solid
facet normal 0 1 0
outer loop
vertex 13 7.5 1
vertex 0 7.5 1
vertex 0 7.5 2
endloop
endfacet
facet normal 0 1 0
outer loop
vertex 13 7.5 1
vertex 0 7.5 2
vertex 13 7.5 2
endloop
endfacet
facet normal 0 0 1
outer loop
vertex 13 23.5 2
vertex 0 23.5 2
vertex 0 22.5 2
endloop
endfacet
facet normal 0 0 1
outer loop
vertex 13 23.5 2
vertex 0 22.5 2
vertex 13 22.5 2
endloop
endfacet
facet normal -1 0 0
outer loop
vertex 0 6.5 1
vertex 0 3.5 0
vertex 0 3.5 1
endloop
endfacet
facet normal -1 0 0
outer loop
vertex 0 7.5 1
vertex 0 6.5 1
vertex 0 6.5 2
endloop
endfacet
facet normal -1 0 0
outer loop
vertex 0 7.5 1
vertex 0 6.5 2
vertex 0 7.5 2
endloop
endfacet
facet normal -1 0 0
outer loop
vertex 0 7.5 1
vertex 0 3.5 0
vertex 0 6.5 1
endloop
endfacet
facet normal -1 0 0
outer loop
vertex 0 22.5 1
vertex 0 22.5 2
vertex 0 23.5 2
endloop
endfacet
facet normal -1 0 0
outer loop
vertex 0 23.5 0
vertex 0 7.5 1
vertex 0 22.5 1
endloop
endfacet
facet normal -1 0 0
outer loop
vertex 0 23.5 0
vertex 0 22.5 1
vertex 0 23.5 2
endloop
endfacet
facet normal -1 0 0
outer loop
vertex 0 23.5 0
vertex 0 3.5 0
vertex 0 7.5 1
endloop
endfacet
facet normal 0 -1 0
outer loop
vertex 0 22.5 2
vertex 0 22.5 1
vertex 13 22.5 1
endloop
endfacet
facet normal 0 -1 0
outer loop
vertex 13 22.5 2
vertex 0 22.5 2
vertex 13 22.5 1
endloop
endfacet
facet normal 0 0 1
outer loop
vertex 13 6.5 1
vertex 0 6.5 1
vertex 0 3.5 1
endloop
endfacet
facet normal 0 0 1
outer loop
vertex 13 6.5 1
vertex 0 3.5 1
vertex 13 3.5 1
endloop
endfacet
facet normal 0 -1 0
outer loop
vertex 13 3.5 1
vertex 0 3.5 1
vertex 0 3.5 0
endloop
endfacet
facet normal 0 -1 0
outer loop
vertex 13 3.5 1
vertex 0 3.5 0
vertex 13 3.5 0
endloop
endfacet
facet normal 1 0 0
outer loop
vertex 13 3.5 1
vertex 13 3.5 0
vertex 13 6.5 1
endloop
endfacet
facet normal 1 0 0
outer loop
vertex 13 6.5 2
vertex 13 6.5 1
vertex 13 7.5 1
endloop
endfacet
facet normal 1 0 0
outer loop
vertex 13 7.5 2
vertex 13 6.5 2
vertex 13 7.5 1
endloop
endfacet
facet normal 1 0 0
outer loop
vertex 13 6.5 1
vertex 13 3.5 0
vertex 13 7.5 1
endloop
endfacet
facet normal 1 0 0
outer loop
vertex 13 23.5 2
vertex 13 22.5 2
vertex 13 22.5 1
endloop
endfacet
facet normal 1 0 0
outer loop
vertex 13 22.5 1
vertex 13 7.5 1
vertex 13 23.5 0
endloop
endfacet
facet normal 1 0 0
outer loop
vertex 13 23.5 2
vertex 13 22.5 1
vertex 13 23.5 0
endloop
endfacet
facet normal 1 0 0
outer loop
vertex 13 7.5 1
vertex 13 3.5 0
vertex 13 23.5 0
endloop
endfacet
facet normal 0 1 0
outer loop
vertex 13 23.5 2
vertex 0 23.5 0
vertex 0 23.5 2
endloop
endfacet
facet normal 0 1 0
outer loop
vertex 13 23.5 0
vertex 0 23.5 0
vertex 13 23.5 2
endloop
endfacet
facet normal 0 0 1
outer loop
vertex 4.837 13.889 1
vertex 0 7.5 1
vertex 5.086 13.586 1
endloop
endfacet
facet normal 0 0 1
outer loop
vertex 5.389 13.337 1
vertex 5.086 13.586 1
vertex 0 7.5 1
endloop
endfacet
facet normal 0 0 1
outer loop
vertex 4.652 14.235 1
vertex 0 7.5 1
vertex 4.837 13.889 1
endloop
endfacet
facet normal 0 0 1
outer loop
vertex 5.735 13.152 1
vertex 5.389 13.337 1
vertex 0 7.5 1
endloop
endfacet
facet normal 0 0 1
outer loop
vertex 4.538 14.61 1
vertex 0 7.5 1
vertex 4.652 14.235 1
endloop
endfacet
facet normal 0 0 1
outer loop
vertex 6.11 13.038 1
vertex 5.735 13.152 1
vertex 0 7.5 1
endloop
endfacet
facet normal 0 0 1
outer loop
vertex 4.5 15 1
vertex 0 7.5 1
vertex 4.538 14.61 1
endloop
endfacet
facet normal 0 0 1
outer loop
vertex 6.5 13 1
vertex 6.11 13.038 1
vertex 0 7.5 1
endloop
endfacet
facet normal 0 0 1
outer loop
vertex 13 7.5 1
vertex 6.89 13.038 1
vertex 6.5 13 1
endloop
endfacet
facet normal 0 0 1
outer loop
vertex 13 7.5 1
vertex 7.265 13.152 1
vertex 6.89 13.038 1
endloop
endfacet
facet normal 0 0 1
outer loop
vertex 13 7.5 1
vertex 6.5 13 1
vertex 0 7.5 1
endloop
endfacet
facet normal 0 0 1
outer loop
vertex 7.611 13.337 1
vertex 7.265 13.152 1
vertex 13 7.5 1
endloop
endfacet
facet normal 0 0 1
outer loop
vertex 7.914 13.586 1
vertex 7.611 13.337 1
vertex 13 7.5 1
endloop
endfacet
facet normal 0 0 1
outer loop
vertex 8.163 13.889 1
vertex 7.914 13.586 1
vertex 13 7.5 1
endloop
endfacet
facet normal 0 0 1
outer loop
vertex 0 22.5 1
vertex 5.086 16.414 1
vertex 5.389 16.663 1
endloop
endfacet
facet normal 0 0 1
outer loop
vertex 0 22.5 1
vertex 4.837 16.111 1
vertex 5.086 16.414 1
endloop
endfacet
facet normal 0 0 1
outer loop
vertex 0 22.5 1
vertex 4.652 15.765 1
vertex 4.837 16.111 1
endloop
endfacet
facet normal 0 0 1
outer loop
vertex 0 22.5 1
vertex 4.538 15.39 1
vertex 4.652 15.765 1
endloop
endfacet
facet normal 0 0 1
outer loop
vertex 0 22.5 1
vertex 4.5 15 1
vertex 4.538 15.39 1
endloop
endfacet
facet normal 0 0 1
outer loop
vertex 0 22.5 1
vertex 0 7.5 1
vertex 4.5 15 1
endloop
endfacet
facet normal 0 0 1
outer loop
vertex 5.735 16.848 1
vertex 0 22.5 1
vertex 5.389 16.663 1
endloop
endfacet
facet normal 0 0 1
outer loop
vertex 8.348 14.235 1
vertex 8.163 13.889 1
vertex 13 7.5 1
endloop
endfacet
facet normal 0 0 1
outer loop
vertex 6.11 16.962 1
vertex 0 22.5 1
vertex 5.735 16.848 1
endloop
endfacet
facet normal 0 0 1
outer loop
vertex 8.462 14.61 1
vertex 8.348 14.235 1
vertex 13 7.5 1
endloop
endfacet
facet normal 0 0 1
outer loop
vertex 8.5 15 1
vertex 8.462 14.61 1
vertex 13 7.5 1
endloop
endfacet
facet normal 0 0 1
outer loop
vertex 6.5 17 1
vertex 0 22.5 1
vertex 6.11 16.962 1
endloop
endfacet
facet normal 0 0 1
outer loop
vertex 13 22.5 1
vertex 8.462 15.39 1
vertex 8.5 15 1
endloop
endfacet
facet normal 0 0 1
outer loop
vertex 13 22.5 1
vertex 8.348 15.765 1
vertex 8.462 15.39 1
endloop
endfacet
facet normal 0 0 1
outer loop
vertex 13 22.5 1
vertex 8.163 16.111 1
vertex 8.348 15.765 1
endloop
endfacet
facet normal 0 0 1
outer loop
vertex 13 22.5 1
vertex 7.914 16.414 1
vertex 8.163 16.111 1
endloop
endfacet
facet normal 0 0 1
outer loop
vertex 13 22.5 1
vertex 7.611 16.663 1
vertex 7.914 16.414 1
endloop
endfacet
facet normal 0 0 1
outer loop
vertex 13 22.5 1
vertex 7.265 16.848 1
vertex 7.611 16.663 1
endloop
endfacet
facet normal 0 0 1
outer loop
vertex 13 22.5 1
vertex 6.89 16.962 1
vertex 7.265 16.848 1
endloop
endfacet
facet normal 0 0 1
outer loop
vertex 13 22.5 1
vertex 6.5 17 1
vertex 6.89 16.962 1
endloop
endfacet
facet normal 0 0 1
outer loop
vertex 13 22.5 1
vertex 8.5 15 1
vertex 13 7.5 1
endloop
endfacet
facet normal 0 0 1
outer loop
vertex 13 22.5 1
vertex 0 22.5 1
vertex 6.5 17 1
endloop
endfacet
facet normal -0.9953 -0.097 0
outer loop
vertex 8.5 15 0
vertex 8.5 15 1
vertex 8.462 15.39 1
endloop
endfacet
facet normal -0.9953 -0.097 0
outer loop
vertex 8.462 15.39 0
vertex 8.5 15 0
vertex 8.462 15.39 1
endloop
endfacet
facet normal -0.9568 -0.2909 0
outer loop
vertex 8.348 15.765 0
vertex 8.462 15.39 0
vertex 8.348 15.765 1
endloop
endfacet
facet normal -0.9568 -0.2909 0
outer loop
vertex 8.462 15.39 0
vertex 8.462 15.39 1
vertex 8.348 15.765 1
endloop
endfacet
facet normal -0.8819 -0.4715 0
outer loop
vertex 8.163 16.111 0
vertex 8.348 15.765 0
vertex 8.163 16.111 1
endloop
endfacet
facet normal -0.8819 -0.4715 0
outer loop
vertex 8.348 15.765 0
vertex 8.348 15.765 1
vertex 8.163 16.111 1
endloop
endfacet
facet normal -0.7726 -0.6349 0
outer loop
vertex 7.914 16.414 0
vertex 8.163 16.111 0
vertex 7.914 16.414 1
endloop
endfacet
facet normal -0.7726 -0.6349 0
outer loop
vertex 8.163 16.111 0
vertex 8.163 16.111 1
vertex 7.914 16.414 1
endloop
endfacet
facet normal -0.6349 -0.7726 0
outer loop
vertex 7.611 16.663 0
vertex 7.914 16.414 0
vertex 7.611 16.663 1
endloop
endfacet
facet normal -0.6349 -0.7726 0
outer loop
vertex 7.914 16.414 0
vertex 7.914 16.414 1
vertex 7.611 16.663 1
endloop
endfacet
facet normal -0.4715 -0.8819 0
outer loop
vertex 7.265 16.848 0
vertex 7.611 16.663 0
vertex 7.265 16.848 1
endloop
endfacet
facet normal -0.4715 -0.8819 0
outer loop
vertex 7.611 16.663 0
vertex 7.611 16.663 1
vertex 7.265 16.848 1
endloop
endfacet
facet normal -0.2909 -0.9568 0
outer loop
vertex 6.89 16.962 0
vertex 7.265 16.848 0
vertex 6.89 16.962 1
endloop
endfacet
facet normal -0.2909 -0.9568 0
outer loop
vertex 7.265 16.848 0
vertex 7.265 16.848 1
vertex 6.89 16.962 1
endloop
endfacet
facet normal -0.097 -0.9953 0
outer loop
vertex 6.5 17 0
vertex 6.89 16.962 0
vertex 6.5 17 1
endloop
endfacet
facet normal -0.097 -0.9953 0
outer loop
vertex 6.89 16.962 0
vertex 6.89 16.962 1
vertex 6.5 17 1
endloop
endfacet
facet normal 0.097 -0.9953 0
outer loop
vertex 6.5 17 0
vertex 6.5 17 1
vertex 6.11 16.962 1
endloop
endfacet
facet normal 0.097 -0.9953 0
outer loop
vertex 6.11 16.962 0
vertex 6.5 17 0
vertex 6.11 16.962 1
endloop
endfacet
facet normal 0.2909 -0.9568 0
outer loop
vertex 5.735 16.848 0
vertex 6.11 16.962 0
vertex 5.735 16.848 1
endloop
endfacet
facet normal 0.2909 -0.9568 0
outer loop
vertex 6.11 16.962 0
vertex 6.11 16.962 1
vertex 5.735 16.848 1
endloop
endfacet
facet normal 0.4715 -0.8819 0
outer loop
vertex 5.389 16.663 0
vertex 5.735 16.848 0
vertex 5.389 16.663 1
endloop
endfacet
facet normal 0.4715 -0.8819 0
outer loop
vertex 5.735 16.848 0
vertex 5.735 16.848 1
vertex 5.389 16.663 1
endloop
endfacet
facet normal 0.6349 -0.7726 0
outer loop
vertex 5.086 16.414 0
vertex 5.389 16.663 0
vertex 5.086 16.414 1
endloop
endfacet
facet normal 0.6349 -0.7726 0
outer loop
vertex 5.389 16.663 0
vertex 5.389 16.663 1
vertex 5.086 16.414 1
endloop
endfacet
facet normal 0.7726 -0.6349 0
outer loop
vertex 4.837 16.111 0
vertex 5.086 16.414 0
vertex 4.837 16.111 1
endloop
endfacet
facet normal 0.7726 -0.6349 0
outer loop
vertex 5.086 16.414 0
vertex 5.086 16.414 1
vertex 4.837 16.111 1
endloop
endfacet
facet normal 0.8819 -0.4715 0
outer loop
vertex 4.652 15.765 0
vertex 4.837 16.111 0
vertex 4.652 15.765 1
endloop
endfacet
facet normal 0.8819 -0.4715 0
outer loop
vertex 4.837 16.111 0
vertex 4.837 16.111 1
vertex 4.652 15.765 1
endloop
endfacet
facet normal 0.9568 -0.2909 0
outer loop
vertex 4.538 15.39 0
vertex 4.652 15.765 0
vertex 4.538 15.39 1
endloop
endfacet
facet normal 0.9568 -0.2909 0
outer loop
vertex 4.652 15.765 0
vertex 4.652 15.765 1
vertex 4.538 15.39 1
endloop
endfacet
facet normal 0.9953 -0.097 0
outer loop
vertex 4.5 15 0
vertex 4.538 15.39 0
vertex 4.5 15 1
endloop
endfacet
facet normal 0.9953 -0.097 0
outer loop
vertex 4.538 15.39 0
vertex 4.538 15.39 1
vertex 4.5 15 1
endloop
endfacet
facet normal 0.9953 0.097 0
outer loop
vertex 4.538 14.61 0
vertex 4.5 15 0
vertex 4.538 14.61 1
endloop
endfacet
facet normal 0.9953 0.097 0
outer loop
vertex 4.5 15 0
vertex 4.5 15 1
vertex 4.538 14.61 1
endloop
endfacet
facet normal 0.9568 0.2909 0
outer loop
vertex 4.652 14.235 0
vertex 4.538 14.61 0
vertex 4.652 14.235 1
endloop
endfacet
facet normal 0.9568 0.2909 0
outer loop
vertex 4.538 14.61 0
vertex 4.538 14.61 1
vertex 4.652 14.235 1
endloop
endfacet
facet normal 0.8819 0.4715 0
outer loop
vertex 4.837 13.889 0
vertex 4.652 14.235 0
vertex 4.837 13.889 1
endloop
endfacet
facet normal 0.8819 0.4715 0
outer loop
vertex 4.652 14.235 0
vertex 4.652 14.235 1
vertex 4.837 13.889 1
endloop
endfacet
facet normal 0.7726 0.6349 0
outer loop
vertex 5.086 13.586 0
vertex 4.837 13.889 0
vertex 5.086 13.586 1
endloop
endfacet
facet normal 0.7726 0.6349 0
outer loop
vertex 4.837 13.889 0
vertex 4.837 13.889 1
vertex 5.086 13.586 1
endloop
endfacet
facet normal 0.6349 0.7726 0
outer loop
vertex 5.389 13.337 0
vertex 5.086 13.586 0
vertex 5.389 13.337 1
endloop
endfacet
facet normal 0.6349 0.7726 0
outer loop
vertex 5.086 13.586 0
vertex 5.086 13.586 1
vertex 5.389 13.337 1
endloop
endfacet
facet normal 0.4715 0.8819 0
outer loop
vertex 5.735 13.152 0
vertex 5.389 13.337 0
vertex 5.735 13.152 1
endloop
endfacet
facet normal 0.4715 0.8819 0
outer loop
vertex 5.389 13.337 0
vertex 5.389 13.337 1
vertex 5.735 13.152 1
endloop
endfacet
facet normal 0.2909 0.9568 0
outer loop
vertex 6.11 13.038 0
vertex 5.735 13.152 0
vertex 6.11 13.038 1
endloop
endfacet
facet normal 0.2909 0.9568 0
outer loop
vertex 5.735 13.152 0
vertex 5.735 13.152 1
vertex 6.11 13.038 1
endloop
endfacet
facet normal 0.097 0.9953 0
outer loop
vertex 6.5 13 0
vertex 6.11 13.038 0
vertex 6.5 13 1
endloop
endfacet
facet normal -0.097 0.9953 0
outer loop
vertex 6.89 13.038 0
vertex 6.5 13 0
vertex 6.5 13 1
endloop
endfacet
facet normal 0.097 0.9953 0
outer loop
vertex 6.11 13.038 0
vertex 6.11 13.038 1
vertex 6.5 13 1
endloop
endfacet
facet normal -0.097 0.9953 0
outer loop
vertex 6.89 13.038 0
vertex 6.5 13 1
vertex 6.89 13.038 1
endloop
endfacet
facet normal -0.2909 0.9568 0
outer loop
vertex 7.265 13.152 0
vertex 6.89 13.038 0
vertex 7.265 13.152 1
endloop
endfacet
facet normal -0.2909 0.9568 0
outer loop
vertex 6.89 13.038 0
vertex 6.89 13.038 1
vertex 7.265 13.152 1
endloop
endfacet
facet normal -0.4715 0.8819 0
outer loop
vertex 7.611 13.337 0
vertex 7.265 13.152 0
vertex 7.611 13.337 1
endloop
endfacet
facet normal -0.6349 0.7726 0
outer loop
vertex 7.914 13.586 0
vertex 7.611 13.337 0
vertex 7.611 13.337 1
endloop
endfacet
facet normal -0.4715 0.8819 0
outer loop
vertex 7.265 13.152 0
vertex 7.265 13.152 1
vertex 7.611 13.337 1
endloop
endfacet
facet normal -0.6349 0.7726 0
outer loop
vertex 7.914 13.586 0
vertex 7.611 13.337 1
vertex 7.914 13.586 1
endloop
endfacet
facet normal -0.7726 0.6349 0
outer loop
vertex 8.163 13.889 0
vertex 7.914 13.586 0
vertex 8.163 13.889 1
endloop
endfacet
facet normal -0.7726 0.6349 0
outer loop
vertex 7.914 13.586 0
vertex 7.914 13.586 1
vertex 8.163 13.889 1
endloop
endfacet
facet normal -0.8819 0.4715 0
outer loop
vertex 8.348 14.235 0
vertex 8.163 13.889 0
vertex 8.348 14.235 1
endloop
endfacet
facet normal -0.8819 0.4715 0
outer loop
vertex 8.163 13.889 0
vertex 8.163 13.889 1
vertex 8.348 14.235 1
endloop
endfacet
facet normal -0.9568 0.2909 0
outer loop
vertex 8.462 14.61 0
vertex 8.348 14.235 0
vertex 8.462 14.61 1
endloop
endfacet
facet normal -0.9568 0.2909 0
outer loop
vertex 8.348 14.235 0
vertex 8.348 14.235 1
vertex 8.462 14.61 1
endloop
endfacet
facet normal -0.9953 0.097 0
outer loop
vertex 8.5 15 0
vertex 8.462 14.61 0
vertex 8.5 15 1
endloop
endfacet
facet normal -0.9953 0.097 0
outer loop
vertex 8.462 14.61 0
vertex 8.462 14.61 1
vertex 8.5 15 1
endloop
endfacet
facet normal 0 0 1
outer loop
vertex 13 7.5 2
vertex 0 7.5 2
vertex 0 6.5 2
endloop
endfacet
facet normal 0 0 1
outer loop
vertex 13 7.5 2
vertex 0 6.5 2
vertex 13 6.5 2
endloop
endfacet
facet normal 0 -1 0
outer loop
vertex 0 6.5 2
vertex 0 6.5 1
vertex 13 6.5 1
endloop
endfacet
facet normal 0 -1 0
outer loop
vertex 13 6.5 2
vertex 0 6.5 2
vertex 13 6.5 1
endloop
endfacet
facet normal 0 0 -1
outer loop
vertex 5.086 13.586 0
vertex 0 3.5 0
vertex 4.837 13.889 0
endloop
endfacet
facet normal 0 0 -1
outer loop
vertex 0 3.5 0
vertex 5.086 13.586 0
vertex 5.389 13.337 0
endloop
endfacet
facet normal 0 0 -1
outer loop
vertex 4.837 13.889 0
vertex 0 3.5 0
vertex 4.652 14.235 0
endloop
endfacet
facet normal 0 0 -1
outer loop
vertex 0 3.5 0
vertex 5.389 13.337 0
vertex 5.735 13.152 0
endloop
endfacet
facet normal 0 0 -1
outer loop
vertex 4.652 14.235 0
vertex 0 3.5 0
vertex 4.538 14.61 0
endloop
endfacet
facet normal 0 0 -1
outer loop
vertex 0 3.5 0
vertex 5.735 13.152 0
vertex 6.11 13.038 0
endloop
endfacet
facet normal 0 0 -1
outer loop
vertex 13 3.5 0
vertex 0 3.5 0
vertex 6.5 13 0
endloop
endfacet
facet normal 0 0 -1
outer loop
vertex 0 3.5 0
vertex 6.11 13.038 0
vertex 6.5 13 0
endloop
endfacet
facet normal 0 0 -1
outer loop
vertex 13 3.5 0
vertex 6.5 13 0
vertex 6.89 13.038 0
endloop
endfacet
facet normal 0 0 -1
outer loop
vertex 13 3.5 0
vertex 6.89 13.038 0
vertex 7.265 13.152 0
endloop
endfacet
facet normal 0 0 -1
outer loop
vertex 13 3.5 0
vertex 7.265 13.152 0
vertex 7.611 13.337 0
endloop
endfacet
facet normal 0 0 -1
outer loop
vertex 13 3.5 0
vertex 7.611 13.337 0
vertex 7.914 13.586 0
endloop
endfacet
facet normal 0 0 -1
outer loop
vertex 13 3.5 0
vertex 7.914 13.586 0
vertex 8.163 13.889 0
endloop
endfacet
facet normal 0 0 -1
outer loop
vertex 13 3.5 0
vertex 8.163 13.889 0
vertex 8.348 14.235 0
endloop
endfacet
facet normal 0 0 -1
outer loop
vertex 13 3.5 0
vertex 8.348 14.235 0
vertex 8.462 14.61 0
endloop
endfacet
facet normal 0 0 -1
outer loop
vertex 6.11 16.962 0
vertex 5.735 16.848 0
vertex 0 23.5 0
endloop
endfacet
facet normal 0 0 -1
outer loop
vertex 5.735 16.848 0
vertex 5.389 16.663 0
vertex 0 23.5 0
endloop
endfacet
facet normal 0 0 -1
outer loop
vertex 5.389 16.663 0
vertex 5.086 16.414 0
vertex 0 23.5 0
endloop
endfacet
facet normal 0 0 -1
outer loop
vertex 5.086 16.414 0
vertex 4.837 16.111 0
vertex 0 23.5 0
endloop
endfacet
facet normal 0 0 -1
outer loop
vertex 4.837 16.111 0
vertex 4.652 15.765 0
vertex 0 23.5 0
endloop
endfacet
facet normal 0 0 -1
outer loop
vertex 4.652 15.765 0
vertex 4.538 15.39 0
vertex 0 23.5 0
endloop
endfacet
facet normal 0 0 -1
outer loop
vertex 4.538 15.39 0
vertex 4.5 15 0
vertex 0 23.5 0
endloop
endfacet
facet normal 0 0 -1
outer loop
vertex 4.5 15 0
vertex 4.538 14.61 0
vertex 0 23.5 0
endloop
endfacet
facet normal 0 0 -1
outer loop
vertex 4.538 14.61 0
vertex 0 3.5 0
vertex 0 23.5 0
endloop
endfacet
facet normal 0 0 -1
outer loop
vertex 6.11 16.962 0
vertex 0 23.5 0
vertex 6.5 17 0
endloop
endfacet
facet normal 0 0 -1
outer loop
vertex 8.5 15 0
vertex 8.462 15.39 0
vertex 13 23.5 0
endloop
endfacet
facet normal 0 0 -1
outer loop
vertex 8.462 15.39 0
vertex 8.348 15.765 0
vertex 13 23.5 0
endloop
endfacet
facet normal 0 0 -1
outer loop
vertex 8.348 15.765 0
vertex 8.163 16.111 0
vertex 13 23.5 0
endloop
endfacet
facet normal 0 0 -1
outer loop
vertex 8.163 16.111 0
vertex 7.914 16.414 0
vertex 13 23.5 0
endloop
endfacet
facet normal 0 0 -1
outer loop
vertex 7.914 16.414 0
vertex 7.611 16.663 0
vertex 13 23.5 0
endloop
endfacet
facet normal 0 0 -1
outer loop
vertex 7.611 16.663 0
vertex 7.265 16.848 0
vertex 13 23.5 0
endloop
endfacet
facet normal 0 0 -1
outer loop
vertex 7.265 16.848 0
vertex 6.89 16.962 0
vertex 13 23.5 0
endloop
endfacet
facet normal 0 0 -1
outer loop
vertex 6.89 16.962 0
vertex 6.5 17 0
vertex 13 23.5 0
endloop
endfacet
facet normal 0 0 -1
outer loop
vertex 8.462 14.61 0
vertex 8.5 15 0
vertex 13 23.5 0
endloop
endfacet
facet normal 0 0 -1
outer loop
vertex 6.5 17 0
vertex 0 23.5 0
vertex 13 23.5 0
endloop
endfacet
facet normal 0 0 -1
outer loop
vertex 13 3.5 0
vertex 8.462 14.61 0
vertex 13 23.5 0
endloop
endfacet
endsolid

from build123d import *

# Parameters (mm, degrees)
SKICA1_W                 = 13
SKICA1_H                 = 23.5
P_IDAT_VYSUNUT_M1_DEPTH  = 1
SKICA2_W                 = 13
SKICA2_H                 = 1
P_IDAT_VYSUNUT_M2_DEPTH  = 1
SKICA3_R                 = 2
ODEBRAT_VYSUNUT_M1_DEPTH = 1
SKICA4_W                 = 13
SKICA4_H                 = 3.5
ODEBRAT_VYSUNUT_M2_DEPTH = 10


with BuildPart() as part:
    # Skica1 → Přidat vysunutím1 (new body)
    with BuildSketch(Plane.XY):
        with Locations((6.5, 11.75)):
            Rectangle(SKICA1_W, SKICA1_H)
    extrude(amount=P_IDAT_VYSUNUT_M1_DEPTH)

    # Skica2 → Přidat vysunutím2 (add)
    with BuildSketch(Plane.XY.offset(1)):
        with Locations((6.5, 23)):
            Rectangle(SKICA2_W, SKICA2_H)
        with Locations((6.5, 7)):
            Rectangle(SKICA2_W, SKICA2_H)
    extrude(amount=P_IDAT_VYSUNUT_M2_DEPTH)

    # Skica3 → Odebrat vysunutím1 (cut)
    with BuildSketch(Plane.XY.offset(1)):
        with Locations((6.5, 15)):
            Circle(SKICA3_R)
    extrude(amount=-ODEBRAT_VYSUNUT_M1_DEPTH, mode=Mode.SUBTRACT)

    # Skica4 → Odebrat vysunutím2 (cut)
    with BuildSketch(Plane.XY.offset(1)):
        with Locations((6.5, 1.75)):
            Rectangle(SKICA4_W, SKICA4_H)
    extrude(amount=-ODEBRAT_VYSUNUT_M2_DEPTH, mode=Mode.SUBTRACT)


solid = part.part
